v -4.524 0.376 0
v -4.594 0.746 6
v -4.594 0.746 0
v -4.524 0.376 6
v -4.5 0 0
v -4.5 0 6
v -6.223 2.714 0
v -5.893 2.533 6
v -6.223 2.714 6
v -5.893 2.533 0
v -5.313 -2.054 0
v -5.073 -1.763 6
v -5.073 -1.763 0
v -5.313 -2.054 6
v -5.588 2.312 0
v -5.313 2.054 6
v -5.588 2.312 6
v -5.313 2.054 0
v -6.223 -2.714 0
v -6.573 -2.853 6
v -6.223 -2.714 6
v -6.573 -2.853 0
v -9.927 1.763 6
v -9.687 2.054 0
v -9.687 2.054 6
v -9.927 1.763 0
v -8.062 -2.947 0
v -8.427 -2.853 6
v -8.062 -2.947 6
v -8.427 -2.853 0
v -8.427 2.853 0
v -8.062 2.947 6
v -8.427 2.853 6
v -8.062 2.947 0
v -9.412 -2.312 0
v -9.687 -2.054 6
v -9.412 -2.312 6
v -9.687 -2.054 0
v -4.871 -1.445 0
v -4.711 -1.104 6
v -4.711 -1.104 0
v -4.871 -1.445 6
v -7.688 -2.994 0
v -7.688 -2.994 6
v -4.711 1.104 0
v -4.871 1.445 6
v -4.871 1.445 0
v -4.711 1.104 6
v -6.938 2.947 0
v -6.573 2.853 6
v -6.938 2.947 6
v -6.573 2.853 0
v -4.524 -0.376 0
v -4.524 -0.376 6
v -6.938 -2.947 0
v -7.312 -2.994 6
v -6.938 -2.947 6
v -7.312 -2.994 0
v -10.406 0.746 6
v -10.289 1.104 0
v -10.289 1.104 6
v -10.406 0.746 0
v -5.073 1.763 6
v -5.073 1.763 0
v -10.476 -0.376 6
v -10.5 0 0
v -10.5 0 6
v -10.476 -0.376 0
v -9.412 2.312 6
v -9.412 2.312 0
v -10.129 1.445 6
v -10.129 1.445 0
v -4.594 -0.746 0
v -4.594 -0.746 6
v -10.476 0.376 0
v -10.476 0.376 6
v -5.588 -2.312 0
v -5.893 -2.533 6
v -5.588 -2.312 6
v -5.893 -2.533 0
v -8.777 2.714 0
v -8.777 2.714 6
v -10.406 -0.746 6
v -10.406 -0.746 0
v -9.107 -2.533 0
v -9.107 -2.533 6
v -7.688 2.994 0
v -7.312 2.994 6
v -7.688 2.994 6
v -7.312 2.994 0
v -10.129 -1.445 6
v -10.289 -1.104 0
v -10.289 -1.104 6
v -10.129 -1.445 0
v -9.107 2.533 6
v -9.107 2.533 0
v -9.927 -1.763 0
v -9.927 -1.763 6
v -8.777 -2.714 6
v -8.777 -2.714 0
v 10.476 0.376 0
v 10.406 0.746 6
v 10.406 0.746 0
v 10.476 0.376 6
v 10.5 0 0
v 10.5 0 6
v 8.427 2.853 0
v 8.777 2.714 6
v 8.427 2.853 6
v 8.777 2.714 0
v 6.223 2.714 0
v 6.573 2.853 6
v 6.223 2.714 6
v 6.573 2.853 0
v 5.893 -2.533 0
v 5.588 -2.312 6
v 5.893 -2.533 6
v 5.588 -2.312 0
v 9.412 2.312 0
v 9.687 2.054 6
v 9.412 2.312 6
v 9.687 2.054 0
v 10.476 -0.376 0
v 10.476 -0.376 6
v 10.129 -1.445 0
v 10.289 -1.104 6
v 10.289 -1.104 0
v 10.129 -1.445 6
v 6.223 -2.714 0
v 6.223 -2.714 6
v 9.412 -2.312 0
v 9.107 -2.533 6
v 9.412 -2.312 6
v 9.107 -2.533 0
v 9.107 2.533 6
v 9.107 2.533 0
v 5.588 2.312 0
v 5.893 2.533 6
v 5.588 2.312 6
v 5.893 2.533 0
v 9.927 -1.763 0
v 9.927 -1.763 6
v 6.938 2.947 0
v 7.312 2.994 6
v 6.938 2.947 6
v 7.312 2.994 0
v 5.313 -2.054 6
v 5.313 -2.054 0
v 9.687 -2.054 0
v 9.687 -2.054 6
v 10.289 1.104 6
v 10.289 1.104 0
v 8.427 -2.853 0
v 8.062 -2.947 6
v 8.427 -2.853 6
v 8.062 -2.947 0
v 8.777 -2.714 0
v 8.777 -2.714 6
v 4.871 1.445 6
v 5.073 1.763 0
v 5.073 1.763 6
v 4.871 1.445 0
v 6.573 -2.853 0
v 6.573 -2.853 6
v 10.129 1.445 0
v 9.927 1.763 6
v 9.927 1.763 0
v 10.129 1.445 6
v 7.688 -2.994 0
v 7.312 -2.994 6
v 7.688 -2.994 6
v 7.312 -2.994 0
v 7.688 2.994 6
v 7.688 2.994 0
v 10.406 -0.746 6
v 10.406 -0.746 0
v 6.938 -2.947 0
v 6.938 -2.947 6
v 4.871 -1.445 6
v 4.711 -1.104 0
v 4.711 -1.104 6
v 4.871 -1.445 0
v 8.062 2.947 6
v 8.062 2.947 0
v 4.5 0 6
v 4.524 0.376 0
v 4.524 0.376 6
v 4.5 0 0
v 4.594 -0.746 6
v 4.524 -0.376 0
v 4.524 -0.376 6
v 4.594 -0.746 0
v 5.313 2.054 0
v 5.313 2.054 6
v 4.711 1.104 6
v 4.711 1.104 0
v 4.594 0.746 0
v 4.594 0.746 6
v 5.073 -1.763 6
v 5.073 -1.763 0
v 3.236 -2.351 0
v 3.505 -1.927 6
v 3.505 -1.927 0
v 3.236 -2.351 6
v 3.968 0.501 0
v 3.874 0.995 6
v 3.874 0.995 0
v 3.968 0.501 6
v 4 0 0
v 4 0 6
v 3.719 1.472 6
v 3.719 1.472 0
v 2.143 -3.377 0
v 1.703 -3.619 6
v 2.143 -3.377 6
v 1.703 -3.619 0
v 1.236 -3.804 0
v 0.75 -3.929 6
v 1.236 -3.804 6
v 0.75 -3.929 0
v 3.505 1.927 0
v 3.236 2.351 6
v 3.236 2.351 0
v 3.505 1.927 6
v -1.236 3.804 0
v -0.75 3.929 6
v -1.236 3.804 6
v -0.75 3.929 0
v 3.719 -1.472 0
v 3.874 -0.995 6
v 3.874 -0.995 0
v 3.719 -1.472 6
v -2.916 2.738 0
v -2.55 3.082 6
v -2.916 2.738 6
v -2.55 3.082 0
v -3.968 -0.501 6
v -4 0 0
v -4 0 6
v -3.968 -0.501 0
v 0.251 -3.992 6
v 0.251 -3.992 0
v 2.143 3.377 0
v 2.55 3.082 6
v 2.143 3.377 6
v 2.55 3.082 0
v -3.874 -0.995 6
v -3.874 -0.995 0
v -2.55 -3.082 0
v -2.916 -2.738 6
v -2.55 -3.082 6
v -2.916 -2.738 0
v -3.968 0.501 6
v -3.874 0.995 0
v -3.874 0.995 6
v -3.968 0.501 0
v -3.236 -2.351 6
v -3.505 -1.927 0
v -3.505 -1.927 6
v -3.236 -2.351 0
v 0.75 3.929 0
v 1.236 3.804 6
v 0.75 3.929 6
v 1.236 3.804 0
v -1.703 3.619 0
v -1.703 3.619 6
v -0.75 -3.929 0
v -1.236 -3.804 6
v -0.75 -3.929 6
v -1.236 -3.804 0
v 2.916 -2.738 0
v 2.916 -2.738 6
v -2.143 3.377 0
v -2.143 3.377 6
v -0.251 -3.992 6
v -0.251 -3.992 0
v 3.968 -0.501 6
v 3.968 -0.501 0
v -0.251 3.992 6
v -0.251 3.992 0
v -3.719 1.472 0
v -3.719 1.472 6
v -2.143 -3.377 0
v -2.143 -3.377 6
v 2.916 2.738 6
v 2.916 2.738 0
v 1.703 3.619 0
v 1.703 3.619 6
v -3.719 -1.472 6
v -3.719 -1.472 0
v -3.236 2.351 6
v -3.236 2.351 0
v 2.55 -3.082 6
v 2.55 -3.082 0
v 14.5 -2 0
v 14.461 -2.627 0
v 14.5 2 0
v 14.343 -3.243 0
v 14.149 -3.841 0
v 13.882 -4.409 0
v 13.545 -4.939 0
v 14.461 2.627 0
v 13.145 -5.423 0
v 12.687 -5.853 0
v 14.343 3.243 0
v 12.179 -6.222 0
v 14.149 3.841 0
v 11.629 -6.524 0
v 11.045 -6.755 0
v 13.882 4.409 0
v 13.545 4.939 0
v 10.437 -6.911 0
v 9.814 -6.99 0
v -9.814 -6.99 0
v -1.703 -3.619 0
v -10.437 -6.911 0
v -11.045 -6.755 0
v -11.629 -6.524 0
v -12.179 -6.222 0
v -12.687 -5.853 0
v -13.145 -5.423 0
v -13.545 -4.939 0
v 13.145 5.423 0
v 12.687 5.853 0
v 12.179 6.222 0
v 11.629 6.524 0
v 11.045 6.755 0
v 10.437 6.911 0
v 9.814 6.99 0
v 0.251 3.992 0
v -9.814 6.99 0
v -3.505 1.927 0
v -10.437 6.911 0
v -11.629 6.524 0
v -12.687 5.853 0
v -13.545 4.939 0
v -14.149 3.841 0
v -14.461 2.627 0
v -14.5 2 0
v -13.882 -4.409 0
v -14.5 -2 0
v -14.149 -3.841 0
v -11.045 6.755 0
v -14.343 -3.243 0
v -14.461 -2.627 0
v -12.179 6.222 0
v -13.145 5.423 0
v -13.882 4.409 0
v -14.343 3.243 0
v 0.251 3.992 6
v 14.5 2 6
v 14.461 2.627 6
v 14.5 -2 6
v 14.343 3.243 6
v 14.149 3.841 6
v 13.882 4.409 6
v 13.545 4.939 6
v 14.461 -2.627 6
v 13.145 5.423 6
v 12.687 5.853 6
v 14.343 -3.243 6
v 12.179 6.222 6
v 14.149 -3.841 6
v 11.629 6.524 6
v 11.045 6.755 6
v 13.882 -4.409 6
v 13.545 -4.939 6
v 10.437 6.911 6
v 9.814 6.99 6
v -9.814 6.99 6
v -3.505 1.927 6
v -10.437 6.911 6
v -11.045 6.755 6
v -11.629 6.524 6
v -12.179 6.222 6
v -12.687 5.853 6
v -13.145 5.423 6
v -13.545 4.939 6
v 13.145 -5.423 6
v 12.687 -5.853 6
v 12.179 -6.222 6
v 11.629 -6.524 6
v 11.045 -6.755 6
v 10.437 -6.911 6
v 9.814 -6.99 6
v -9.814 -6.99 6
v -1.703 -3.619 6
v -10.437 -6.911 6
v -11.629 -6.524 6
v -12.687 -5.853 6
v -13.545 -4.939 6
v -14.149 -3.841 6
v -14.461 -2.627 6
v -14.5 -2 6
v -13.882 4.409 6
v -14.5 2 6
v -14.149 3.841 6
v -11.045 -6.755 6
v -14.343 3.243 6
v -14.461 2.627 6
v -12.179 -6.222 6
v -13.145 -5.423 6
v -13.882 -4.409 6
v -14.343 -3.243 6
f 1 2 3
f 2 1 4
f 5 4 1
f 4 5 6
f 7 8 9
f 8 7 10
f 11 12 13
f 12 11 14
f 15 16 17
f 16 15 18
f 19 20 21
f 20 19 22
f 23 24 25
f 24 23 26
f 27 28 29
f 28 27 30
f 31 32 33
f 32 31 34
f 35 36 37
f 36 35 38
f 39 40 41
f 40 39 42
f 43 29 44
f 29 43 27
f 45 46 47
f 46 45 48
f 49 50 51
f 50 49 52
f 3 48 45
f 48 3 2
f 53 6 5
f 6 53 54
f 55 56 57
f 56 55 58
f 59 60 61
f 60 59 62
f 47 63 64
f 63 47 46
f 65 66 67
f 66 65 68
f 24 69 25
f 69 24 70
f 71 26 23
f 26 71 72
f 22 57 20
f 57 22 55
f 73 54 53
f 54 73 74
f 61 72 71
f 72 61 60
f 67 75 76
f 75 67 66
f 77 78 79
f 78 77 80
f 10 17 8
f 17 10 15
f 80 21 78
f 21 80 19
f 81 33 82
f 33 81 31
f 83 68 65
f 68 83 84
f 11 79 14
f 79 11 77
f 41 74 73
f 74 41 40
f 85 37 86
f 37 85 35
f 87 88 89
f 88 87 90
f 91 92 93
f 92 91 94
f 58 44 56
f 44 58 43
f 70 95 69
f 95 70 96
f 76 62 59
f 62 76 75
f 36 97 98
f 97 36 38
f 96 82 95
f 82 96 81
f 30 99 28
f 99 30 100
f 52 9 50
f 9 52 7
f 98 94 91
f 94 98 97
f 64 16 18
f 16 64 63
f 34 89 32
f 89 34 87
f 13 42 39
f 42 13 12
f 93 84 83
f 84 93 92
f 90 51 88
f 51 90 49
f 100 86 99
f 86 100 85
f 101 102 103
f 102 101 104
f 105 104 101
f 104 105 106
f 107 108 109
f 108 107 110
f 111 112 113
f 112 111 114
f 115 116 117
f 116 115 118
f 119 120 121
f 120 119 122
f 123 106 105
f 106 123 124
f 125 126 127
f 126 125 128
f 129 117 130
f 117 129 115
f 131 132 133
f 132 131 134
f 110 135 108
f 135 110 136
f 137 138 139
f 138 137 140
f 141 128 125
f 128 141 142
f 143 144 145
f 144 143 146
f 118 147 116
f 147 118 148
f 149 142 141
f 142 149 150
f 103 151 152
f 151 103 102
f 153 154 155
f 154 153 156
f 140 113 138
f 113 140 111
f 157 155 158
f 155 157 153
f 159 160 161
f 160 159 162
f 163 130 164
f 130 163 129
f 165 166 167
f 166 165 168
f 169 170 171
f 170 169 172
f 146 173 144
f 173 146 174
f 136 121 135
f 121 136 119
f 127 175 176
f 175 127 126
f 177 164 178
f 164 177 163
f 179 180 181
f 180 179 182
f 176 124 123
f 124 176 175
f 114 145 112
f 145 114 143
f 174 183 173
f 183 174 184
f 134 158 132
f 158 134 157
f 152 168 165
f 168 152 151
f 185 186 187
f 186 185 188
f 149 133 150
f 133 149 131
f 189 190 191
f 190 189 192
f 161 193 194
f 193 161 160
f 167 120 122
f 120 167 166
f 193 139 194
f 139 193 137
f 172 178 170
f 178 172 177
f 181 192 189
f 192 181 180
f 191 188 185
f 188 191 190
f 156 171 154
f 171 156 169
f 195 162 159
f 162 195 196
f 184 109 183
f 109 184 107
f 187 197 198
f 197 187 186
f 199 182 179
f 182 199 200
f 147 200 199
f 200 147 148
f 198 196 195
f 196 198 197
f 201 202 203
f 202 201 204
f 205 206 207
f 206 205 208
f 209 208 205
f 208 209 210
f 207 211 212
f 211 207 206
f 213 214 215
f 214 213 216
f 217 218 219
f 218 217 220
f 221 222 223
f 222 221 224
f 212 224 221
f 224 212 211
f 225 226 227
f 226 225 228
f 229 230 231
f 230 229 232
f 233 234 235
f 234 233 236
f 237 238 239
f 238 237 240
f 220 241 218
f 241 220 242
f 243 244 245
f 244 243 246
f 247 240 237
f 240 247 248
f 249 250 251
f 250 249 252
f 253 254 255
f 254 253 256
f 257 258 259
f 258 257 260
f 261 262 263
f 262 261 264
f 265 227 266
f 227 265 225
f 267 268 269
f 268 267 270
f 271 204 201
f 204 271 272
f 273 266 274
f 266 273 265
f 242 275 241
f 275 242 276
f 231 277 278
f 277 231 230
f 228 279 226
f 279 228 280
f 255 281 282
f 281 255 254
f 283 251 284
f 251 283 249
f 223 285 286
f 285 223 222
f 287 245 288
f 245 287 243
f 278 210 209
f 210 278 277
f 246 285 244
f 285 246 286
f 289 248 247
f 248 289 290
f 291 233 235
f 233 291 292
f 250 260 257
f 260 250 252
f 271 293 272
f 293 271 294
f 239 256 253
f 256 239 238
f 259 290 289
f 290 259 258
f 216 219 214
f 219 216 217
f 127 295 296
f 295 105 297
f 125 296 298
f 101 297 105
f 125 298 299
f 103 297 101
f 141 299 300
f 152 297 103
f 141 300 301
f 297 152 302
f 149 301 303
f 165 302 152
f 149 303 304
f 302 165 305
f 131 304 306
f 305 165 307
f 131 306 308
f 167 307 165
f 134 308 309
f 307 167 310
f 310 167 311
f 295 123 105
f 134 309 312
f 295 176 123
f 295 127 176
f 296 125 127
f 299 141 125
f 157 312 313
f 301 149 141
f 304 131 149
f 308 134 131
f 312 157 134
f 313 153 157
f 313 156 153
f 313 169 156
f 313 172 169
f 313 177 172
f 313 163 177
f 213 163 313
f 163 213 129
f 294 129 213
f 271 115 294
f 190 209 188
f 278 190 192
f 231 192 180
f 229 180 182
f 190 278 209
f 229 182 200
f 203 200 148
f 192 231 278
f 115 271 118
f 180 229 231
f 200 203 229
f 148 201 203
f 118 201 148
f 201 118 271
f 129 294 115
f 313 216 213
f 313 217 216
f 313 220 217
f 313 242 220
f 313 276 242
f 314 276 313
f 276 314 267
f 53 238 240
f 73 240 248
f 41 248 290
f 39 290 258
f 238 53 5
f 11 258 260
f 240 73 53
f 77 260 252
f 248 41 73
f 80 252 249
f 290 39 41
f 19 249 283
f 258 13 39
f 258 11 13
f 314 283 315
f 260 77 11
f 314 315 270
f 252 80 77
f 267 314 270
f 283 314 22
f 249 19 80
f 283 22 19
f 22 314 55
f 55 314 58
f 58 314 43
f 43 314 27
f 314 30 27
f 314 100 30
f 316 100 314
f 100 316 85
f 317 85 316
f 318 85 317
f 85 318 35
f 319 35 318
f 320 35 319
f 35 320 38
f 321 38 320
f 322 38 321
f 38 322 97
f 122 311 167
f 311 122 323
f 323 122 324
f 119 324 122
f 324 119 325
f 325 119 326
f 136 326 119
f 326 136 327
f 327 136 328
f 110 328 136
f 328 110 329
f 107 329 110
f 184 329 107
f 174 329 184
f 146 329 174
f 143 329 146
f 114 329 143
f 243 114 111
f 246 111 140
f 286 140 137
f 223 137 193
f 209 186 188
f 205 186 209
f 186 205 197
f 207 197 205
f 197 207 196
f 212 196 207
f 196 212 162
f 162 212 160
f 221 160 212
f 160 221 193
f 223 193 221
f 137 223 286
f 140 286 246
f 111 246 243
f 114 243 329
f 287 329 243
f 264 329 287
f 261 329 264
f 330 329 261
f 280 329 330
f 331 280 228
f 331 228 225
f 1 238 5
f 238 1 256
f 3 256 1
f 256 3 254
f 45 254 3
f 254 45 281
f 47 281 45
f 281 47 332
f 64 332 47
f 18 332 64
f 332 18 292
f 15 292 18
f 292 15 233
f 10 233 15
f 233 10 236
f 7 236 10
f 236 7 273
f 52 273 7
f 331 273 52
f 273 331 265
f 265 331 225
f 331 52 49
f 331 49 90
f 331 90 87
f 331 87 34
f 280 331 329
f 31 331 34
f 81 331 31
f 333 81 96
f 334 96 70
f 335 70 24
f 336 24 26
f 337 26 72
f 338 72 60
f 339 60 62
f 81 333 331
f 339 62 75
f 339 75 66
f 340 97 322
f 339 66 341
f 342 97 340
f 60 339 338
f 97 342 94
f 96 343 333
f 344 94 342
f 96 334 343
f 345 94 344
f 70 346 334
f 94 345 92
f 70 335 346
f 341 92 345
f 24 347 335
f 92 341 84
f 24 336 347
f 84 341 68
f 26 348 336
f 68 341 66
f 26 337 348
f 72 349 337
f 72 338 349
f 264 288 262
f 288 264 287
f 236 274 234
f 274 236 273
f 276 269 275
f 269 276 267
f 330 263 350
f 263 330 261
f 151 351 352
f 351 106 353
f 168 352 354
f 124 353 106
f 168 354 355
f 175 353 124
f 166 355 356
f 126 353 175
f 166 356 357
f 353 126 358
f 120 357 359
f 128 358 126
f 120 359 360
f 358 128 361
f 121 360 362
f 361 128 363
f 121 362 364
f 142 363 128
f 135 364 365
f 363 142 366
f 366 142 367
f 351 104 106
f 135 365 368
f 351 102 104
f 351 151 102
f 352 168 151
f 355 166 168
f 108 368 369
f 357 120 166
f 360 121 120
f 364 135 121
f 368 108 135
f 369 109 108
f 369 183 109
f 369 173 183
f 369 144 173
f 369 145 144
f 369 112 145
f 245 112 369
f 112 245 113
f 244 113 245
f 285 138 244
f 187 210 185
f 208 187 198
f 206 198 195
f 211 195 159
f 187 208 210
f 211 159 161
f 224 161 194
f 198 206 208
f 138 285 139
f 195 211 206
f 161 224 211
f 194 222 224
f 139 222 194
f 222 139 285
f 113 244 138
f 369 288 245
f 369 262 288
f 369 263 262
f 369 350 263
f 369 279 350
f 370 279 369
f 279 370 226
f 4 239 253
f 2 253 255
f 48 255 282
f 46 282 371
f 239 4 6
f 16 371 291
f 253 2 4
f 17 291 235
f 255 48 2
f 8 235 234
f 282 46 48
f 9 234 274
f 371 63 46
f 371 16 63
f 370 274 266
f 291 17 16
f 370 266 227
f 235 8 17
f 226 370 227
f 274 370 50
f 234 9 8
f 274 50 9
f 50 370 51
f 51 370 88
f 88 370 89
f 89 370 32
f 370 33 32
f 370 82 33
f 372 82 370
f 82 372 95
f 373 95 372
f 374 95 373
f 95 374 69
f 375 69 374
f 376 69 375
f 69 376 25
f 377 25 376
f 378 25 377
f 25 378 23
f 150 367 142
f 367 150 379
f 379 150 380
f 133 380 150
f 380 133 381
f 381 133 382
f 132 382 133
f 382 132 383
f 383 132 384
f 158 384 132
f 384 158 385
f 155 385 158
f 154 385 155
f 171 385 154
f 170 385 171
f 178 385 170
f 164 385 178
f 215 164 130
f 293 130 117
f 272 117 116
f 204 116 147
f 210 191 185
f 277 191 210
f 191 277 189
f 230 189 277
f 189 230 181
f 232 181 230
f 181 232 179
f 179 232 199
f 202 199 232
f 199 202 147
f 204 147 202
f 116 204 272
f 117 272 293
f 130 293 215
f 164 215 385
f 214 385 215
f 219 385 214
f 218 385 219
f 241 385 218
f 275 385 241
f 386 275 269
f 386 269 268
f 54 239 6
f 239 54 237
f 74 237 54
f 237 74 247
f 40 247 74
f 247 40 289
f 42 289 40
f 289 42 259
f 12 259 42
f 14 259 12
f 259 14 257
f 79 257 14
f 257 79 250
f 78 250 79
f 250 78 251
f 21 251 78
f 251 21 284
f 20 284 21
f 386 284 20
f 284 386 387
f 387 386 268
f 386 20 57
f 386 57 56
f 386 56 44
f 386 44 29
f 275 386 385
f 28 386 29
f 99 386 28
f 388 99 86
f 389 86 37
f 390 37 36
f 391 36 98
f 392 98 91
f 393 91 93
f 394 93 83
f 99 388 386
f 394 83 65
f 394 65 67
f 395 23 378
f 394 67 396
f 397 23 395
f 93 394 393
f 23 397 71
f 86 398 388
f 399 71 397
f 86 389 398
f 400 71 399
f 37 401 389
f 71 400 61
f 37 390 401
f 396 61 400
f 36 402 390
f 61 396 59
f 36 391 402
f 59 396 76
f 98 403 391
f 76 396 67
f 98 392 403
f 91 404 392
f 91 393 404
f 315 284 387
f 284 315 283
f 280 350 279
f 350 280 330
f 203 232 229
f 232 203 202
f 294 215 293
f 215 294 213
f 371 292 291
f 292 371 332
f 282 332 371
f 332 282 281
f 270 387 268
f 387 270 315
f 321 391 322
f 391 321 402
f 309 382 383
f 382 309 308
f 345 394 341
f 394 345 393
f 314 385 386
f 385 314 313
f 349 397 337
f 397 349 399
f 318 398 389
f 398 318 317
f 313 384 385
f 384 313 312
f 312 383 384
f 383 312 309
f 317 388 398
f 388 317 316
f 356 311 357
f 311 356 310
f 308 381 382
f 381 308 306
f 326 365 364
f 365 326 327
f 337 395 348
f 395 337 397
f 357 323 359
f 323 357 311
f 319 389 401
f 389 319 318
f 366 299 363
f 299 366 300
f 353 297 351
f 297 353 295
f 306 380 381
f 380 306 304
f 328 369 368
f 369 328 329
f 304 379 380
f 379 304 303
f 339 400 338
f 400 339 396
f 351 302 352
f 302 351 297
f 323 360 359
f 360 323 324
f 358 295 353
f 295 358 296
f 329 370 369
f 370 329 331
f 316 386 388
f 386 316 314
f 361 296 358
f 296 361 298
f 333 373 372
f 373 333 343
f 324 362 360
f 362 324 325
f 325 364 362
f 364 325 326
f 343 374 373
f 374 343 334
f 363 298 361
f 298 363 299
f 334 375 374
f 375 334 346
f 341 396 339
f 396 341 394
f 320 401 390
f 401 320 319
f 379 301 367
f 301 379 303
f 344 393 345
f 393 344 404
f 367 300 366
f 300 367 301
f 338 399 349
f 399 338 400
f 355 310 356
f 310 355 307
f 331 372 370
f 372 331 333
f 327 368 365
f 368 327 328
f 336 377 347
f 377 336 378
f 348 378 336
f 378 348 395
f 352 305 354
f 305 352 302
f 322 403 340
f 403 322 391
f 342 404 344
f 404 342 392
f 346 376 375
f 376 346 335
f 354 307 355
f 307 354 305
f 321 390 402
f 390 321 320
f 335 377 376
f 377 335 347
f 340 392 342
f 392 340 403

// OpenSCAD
$fn = 50;


difference() {
	union() {
		hull() {
			translate(v = [-9.5000000000, 2.0000000000, 0]) {
				cylinder(h = 6, r = 5);
			}
			translate(v = [9.5000000000, 2.0000000000, 0]) {
				cylinder(h = 6, r = 5);
			}
			translate(v = [-9.5000000000, -2.0000000000, 0]) {
				cylinder(h = 6, r = 5);
			}
			translate(v = [9.5000000000, -2.0000000000, 0]) {
				cylinder(h = 6, r = 5);
			}
		}
	}
	union() {
		#translate(v = [-7.5000000000, 0.0000000000, -100.0000000000]) {
			cylinder(h = 200, r = 3.0000000000);
		}
		#translate(v = [-7.5000000000, 0.0000000000, -100.0000000000]) {
			cylinder(h = 200, r = 3.0000000000);
		}
		#translate(v = [7.5000000000, 0.0000000000, -100.0000000000]) {
			cylinder(h = 200, r = 3.0000000000);
		}
		#translate(v = [7.5000000000, 0.0000000000, -100.0000000000]) {
			cylinder(h = 200, r = 3.0000000000);
		}
		#cylinder(h = 6, r = 4.0000000000);
	}
}
